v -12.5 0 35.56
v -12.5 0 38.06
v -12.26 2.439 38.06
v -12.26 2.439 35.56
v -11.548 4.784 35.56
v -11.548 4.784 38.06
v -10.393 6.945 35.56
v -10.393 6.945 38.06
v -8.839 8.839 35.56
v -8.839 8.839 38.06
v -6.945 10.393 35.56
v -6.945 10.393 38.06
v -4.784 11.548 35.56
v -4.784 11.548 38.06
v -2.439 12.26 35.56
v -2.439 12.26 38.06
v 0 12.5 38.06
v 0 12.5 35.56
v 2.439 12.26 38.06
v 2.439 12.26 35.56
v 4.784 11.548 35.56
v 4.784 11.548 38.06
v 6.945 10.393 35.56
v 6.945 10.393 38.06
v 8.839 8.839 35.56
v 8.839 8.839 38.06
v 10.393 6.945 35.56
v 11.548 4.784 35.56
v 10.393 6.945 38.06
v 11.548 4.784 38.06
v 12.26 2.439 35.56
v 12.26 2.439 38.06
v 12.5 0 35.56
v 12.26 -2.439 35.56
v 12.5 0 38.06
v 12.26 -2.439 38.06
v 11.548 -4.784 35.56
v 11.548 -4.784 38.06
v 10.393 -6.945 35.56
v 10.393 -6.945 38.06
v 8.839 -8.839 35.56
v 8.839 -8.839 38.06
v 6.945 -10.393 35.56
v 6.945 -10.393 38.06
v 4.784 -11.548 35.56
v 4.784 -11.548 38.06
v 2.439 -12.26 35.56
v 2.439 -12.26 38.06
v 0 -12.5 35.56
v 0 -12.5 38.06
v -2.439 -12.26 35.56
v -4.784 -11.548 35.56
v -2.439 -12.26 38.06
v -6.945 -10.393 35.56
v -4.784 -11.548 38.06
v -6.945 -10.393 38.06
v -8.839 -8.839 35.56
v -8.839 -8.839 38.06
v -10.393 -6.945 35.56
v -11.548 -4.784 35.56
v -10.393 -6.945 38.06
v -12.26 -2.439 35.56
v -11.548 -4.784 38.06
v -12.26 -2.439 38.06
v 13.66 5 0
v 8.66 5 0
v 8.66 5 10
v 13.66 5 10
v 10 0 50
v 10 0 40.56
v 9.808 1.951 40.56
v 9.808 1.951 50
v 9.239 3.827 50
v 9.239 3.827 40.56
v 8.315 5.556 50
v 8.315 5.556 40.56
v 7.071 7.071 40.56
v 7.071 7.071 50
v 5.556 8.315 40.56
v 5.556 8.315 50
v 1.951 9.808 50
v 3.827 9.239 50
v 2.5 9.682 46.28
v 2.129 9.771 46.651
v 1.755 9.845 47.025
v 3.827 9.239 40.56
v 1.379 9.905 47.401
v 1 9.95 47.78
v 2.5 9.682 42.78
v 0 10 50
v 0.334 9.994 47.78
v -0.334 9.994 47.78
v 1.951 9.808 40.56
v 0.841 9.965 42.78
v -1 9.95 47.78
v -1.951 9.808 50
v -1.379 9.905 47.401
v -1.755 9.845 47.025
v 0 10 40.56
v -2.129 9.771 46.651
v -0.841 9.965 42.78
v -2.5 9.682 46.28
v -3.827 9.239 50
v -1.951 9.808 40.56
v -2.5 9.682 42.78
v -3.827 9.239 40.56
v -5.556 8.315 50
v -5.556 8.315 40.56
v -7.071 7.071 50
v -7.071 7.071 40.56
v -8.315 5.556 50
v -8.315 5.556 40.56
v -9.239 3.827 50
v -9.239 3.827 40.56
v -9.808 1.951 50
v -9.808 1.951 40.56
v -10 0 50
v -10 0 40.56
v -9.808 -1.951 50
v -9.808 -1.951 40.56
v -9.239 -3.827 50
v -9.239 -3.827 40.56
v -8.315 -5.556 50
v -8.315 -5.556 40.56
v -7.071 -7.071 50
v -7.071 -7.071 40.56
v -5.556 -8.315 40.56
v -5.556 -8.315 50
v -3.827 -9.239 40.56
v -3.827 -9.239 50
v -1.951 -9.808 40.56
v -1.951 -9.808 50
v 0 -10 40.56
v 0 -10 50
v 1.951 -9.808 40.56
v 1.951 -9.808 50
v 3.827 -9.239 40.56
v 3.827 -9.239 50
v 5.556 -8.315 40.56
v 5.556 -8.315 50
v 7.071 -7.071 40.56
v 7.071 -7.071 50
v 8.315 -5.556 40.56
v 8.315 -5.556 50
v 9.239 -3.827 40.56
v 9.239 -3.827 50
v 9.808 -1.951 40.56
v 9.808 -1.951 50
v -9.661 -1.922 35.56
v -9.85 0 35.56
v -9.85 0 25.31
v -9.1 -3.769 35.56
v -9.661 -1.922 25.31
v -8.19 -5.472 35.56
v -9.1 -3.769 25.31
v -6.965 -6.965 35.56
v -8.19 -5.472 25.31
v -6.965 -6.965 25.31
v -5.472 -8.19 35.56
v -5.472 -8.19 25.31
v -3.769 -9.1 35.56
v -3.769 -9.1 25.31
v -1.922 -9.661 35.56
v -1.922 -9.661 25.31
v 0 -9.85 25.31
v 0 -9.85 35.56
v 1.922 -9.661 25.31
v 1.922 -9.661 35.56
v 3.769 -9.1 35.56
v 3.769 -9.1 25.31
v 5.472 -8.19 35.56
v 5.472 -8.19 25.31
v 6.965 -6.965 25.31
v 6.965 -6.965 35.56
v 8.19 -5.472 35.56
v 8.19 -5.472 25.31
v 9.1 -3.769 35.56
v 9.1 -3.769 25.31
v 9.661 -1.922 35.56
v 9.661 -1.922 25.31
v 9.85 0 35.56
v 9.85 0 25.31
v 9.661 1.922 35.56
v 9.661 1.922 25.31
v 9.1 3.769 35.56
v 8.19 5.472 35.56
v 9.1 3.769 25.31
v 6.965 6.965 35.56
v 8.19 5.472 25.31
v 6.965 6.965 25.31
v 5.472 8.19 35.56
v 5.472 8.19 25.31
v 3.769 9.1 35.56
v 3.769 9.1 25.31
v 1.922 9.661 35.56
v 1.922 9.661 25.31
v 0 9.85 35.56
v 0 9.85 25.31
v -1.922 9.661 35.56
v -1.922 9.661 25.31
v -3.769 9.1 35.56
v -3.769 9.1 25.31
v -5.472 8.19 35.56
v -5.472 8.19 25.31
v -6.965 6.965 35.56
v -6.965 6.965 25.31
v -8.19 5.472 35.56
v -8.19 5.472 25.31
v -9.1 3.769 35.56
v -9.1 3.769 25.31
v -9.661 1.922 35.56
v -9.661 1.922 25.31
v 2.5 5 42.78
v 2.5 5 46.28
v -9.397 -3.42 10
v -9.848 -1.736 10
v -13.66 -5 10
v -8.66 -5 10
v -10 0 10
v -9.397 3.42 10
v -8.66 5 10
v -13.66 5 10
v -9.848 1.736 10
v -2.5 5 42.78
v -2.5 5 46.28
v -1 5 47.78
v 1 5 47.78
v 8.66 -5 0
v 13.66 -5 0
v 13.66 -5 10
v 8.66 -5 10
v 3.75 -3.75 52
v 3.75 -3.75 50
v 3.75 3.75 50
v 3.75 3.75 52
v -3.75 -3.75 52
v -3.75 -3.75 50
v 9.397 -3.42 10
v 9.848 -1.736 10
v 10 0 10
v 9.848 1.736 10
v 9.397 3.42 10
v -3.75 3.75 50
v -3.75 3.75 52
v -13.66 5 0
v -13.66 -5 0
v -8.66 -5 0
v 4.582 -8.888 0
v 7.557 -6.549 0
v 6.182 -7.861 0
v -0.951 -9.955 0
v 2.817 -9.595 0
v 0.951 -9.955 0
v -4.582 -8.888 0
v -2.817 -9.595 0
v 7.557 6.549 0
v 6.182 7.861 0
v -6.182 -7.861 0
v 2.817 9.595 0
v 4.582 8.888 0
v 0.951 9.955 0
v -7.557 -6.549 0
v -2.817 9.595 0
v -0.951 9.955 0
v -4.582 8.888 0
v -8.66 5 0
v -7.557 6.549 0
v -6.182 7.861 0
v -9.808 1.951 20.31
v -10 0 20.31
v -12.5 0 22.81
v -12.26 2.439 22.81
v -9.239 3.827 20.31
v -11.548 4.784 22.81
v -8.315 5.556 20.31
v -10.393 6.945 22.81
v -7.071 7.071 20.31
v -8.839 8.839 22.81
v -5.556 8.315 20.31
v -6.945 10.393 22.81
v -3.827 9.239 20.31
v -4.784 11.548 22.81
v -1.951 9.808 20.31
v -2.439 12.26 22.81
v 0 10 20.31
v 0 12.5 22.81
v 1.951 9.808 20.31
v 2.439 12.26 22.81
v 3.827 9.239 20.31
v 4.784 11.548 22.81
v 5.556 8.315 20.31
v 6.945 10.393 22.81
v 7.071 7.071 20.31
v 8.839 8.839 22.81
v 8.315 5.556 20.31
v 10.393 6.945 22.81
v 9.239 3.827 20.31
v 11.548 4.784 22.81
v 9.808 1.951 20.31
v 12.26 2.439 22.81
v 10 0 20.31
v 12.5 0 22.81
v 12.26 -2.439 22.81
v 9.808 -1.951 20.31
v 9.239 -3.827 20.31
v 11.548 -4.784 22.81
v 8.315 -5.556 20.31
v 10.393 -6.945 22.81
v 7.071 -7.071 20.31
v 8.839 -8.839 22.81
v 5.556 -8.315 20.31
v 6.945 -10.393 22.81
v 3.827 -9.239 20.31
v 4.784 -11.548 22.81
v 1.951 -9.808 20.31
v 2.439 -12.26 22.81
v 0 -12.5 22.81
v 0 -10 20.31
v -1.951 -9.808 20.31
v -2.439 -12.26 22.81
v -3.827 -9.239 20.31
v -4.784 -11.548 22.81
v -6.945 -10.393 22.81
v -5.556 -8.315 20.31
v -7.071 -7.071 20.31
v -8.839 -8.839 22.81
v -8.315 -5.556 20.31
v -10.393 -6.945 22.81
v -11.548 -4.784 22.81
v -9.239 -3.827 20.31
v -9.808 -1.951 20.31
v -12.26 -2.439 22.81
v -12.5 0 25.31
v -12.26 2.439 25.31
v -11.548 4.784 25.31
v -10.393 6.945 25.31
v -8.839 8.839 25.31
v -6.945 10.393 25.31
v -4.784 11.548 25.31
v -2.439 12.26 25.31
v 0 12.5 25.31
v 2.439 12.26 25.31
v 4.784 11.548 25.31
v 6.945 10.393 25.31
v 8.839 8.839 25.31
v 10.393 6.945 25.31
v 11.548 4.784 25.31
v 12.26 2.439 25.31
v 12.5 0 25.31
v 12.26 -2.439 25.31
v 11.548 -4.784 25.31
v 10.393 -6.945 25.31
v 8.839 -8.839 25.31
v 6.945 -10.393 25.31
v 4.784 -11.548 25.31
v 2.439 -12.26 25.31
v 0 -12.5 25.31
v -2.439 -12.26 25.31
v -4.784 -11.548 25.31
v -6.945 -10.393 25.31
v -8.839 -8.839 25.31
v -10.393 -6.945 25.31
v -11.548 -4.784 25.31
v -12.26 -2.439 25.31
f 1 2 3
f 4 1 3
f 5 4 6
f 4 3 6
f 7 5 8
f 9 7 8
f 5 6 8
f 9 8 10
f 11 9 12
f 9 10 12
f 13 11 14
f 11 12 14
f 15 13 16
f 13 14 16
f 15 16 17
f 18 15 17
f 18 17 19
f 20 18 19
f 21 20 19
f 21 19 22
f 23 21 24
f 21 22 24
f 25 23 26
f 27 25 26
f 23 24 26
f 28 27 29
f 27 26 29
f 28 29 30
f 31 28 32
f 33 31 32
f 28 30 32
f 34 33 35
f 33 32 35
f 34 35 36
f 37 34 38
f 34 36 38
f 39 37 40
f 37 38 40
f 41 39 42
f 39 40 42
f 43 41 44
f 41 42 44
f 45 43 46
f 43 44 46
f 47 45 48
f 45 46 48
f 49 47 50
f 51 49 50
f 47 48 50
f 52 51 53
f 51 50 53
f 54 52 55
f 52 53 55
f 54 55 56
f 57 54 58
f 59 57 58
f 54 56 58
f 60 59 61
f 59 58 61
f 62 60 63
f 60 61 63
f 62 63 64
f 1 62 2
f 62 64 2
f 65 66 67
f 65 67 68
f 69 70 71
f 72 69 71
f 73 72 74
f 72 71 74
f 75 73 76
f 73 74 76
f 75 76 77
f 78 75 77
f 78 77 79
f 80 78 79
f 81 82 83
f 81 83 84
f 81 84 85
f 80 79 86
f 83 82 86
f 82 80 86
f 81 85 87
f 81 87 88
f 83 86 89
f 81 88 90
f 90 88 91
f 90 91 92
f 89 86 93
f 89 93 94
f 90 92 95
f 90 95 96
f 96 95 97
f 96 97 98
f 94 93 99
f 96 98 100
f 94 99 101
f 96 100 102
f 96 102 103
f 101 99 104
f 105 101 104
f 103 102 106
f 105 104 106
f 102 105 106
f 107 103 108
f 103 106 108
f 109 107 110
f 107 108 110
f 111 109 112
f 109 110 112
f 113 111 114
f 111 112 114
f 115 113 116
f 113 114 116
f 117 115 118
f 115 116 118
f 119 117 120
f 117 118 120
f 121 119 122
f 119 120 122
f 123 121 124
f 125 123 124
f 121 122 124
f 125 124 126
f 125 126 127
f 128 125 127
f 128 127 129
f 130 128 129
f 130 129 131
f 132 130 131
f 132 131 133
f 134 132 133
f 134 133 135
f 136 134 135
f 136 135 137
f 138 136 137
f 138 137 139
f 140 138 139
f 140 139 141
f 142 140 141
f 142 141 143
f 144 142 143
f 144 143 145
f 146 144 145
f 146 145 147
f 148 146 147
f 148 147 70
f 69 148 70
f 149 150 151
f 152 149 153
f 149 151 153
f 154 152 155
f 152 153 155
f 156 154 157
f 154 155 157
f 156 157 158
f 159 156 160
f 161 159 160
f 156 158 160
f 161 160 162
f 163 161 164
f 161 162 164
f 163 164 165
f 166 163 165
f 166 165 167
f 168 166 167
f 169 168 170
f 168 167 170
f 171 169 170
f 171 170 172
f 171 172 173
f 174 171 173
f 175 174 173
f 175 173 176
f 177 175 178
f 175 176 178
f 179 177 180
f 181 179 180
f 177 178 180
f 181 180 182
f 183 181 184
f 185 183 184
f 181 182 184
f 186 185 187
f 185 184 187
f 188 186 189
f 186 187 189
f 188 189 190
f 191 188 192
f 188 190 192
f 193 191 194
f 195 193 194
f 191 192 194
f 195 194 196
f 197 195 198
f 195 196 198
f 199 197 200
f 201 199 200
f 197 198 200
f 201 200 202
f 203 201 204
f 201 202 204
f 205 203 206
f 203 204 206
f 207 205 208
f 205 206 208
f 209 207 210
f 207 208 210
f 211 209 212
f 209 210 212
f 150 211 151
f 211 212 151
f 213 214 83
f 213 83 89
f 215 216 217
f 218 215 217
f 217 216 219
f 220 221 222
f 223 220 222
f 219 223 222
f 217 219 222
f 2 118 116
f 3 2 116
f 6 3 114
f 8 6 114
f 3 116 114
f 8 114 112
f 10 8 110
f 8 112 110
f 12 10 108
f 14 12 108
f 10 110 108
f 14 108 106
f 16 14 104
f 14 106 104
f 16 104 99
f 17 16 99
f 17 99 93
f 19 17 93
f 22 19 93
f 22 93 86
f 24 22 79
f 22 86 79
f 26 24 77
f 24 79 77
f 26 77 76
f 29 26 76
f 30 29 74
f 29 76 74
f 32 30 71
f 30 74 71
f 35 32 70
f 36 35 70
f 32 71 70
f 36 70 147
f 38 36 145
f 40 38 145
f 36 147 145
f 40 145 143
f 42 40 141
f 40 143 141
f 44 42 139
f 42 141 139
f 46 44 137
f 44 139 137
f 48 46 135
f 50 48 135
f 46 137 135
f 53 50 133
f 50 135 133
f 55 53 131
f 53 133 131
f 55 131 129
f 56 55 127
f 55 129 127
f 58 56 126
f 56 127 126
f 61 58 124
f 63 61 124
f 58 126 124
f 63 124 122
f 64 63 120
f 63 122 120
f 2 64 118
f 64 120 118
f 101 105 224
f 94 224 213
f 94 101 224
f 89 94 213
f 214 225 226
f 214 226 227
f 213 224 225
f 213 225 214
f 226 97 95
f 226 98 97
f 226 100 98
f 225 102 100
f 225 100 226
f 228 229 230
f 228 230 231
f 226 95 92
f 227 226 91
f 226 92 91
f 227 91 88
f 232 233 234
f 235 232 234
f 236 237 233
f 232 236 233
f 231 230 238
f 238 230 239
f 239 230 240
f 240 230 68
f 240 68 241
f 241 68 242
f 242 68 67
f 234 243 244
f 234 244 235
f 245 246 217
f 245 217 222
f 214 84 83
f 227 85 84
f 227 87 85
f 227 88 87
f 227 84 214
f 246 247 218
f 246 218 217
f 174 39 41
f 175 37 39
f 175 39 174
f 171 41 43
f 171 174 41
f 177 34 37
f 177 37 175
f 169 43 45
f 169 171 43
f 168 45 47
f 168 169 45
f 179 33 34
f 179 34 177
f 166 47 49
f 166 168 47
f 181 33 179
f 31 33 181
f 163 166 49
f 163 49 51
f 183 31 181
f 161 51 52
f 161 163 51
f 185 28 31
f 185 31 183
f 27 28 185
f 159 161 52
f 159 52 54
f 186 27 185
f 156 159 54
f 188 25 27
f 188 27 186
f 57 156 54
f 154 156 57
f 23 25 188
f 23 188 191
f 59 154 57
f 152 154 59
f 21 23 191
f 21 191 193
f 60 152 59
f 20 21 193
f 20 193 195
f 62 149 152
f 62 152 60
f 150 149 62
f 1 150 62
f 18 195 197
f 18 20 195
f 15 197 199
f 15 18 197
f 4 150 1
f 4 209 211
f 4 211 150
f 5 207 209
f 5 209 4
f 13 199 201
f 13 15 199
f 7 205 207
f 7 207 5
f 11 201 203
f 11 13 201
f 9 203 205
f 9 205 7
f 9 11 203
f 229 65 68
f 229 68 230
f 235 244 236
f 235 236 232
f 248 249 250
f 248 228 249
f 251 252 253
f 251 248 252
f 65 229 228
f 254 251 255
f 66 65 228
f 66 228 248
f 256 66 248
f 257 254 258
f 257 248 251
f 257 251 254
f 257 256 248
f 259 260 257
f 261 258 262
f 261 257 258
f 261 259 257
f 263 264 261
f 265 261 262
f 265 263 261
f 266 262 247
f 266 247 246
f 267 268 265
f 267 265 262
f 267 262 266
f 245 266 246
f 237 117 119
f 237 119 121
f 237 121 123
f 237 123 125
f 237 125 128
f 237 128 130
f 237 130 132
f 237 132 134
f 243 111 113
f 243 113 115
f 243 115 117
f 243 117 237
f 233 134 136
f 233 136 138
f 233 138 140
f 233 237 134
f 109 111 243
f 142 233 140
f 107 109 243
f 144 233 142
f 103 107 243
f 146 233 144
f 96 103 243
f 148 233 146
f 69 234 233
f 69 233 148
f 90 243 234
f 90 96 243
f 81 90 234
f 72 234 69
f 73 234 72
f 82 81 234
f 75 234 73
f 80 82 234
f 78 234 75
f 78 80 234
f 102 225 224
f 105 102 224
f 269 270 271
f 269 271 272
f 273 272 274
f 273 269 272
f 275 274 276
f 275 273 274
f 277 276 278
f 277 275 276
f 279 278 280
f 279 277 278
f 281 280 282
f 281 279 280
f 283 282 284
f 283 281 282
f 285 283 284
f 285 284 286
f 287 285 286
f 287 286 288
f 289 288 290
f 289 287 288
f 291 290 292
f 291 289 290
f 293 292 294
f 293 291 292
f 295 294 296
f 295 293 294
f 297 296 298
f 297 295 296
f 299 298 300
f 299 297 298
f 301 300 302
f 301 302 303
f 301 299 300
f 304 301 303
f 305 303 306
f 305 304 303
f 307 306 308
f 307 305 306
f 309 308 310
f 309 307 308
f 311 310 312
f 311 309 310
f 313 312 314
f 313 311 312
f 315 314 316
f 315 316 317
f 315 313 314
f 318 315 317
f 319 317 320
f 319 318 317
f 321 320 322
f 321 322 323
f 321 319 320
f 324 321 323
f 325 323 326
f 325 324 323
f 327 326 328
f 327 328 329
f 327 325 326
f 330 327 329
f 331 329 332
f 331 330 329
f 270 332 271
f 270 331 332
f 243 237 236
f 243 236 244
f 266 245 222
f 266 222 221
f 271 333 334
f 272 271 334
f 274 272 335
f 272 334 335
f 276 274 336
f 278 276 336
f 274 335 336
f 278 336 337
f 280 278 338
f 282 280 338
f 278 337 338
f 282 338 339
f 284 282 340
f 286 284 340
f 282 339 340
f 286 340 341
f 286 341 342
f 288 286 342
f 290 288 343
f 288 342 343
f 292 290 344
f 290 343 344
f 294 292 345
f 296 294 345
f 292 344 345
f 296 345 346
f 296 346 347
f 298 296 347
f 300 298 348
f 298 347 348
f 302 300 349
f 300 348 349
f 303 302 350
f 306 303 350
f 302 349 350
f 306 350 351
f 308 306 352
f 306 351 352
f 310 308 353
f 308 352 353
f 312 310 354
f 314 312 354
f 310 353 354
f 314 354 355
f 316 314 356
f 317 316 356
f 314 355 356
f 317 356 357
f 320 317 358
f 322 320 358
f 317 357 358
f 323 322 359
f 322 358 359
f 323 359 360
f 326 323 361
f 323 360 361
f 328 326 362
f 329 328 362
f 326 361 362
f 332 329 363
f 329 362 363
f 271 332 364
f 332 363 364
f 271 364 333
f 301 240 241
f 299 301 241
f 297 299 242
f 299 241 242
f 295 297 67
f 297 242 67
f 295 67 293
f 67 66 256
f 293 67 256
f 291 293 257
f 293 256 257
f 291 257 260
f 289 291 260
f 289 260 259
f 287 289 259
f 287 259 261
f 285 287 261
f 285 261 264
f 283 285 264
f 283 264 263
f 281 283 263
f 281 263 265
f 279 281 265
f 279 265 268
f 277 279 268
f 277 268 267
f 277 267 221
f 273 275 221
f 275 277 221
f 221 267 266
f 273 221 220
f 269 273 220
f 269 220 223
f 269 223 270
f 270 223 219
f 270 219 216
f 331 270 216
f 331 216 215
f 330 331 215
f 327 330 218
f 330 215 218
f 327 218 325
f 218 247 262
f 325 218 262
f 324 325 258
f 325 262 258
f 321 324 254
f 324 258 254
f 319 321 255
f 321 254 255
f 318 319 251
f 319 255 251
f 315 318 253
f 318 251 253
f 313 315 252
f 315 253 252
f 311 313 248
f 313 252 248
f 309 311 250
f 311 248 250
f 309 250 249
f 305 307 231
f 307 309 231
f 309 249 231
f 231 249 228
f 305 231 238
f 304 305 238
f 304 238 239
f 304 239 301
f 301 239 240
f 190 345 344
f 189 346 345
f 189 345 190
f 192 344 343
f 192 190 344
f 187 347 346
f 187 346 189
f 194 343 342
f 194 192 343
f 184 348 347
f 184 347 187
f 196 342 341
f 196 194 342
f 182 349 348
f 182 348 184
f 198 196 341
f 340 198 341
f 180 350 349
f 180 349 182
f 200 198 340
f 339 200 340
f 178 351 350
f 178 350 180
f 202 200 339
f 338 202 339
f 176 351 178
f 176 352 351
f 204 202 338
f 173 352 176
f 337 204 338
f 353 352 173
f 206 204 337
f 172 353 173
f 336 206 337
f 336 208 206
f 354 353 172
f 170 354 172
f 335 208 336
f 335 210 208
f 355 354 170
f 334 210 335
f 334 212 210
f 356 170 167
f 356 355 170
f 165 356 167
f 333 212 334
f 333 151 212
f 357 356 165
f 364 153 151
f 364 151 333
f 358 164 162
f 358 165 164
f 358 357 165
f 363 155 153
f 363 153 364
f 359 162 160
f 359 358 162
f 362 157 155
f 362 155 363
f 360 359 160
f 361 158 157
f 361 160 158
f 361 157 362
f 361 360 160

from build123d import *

# Parameters (mm, degrees)
SKETCH1_R           = 10
BOSS_EXTRUDE1_DEPTH = 50
BOSS_EXTRUDE2_DEPTH = 10
BOSS_EXTRUDE5_START = -25.31
SKETCH6_R           = 12.5
BOSS_EXTRUDE5_DEPTH = 5
LPATTERN1_COUNT     = 2
LPATTERN1_PITCH     = 15.25
CHAMFER2_SIZE       = 2.5
CUT_EXTRUDE1_START  = 10
SKETCH7_W           = 5
SKETCH7_H           = 5
CUT_EXTRUDE1_DEPTH  = 5
CHAMFER3_SIZE       = 1.5
SKETCH8_W           = 7.5
SKETCH8_H           = 7.5
BOSS_EXTRUDE6_DEPTH = 2
SKETCH10_R          = 10
SKETCH10_R_2        = 9.85
CUT_EXTRUDE3_DEPTH  = 10.25


with BuildPart() as part:
    # Sketch1 → Boss-Extrude1 (new body)
    with BuildSketch(Plane.XY):
        Circle(SKETCH1_R)
    extrude(amount=BOSS_EXTRUDE1_DEPTH)

    # Sketch2 → Boss-Extrude2 (add)
    with BuildSketch(Plane(origin=(0, 0, 0), x_dir=(-1, 0, 0), z_dir=(0, 0, -1))):
        with BuildLine():
            Line((-8.660254038, 5), (-13.660254038, 5))
            Line((-13.660254038, 5), (-13.660254038, -5))
            Line((-13.660254038, -5), (-8.660254038, -5))
            ThreePointArc((-8.660254038, -5), (-10, 0), (-8.660254038, 5))
        make_face()
        with BuildLine():
            Line((8.660254038, -5), (13.660254038, -5))
            Line((13.660254038, -5), (13.660254038, 5))
            Line((13.660254038, 5), (8.660254038, 5))
            ThreePointArc((8.660254038, 5), (10, 0), (8.660254038, -5))
        make_face()
    extrude(amount=-BOSS_EXTRUDE2_DEPTH)

    # Sketch6 → Boss-Extrude5 (add)
    with BuildSketch(Plane(origin=(0, 0, 0), x_dir=(-1, 0, 0), z_dir=(0, 0, -1)).offset(BOSS_EXTRUDE5_START)):
        Circle(SKETCH6_R)
    boss_extrude5 = extrude(amount=BOSS_EXTRUDE5_DEPTH)

    # LPattern1: Boss-Extrude5 ×2
    with Locations(*[(0, 0, i * LPATTERN1_PITCH) for i in range(1, LPATTERN1_COUNT)]):
        add(boss_extrude5)

    # Chamfer2
    chamfer2_edges = [part.edges().sort_by_distance(p)[0] for p in [
        (12.5, 0, 20.31),
        (12.5, 0, 40.56),
    ]]
    chamfer(chamfer2_edges, length=CHAMFER2_SIZE - 0.0001)  # a hair under: the kernel refuses the full size

    # Sketch7 → Cut-Extrude1 (cut)
    with BuildSketch(Plane(origin=(0, 0, 0), x_dir=(1, 0, 0), z_dir=(0, 1, 0)).offset(CUT_EXTRUDE1_START)):
        with Locations((0, -45.28)):
            Rectangle(SKETCH7_W, SKETCH7_H)
    extrude(amount=-CUT_EXTRUDE1_DEPTH, mode=Mode.SUBTRACT)

    # Chamfer3
    chamfer3_edges = [part.edges().sort_by_distance(p)[0] for p in [
        (2.5, 7.341229183, 47.78),
        (-2.5, 7.341229183, 47.78),
    ]]
    chamfer(chamfer3_edges, length=CHAMFER3_SIZE)

    # Sketch8 → Boss-Extrude6 (add)
    with BuildSketch(Plane.XY.offset(50)):
        Rectangle(SKETCH8_W, SKETCH8_H)
    extrude(amount=BOSS_EXTRUDE6_DEPTH)

    # Sketch10 → Cut-Extrude3 (cut)
    with BuildSketch(Plane.XY.offset(25.31)):
        with Locations(Location((0, 0, 0), (0, 0, 180))):
            Circle(SKETCH10_R)
        with Locations(Location((0, 0, 0), (0, 0, 180))):
            Circle(SKETCH10_R_2, mode=Mode.SUBTRACT)
    extrude(amount=CUT_EXTRUDE3_DEPTH, mode=Mode.SUBTRACT)


solid = part.part
